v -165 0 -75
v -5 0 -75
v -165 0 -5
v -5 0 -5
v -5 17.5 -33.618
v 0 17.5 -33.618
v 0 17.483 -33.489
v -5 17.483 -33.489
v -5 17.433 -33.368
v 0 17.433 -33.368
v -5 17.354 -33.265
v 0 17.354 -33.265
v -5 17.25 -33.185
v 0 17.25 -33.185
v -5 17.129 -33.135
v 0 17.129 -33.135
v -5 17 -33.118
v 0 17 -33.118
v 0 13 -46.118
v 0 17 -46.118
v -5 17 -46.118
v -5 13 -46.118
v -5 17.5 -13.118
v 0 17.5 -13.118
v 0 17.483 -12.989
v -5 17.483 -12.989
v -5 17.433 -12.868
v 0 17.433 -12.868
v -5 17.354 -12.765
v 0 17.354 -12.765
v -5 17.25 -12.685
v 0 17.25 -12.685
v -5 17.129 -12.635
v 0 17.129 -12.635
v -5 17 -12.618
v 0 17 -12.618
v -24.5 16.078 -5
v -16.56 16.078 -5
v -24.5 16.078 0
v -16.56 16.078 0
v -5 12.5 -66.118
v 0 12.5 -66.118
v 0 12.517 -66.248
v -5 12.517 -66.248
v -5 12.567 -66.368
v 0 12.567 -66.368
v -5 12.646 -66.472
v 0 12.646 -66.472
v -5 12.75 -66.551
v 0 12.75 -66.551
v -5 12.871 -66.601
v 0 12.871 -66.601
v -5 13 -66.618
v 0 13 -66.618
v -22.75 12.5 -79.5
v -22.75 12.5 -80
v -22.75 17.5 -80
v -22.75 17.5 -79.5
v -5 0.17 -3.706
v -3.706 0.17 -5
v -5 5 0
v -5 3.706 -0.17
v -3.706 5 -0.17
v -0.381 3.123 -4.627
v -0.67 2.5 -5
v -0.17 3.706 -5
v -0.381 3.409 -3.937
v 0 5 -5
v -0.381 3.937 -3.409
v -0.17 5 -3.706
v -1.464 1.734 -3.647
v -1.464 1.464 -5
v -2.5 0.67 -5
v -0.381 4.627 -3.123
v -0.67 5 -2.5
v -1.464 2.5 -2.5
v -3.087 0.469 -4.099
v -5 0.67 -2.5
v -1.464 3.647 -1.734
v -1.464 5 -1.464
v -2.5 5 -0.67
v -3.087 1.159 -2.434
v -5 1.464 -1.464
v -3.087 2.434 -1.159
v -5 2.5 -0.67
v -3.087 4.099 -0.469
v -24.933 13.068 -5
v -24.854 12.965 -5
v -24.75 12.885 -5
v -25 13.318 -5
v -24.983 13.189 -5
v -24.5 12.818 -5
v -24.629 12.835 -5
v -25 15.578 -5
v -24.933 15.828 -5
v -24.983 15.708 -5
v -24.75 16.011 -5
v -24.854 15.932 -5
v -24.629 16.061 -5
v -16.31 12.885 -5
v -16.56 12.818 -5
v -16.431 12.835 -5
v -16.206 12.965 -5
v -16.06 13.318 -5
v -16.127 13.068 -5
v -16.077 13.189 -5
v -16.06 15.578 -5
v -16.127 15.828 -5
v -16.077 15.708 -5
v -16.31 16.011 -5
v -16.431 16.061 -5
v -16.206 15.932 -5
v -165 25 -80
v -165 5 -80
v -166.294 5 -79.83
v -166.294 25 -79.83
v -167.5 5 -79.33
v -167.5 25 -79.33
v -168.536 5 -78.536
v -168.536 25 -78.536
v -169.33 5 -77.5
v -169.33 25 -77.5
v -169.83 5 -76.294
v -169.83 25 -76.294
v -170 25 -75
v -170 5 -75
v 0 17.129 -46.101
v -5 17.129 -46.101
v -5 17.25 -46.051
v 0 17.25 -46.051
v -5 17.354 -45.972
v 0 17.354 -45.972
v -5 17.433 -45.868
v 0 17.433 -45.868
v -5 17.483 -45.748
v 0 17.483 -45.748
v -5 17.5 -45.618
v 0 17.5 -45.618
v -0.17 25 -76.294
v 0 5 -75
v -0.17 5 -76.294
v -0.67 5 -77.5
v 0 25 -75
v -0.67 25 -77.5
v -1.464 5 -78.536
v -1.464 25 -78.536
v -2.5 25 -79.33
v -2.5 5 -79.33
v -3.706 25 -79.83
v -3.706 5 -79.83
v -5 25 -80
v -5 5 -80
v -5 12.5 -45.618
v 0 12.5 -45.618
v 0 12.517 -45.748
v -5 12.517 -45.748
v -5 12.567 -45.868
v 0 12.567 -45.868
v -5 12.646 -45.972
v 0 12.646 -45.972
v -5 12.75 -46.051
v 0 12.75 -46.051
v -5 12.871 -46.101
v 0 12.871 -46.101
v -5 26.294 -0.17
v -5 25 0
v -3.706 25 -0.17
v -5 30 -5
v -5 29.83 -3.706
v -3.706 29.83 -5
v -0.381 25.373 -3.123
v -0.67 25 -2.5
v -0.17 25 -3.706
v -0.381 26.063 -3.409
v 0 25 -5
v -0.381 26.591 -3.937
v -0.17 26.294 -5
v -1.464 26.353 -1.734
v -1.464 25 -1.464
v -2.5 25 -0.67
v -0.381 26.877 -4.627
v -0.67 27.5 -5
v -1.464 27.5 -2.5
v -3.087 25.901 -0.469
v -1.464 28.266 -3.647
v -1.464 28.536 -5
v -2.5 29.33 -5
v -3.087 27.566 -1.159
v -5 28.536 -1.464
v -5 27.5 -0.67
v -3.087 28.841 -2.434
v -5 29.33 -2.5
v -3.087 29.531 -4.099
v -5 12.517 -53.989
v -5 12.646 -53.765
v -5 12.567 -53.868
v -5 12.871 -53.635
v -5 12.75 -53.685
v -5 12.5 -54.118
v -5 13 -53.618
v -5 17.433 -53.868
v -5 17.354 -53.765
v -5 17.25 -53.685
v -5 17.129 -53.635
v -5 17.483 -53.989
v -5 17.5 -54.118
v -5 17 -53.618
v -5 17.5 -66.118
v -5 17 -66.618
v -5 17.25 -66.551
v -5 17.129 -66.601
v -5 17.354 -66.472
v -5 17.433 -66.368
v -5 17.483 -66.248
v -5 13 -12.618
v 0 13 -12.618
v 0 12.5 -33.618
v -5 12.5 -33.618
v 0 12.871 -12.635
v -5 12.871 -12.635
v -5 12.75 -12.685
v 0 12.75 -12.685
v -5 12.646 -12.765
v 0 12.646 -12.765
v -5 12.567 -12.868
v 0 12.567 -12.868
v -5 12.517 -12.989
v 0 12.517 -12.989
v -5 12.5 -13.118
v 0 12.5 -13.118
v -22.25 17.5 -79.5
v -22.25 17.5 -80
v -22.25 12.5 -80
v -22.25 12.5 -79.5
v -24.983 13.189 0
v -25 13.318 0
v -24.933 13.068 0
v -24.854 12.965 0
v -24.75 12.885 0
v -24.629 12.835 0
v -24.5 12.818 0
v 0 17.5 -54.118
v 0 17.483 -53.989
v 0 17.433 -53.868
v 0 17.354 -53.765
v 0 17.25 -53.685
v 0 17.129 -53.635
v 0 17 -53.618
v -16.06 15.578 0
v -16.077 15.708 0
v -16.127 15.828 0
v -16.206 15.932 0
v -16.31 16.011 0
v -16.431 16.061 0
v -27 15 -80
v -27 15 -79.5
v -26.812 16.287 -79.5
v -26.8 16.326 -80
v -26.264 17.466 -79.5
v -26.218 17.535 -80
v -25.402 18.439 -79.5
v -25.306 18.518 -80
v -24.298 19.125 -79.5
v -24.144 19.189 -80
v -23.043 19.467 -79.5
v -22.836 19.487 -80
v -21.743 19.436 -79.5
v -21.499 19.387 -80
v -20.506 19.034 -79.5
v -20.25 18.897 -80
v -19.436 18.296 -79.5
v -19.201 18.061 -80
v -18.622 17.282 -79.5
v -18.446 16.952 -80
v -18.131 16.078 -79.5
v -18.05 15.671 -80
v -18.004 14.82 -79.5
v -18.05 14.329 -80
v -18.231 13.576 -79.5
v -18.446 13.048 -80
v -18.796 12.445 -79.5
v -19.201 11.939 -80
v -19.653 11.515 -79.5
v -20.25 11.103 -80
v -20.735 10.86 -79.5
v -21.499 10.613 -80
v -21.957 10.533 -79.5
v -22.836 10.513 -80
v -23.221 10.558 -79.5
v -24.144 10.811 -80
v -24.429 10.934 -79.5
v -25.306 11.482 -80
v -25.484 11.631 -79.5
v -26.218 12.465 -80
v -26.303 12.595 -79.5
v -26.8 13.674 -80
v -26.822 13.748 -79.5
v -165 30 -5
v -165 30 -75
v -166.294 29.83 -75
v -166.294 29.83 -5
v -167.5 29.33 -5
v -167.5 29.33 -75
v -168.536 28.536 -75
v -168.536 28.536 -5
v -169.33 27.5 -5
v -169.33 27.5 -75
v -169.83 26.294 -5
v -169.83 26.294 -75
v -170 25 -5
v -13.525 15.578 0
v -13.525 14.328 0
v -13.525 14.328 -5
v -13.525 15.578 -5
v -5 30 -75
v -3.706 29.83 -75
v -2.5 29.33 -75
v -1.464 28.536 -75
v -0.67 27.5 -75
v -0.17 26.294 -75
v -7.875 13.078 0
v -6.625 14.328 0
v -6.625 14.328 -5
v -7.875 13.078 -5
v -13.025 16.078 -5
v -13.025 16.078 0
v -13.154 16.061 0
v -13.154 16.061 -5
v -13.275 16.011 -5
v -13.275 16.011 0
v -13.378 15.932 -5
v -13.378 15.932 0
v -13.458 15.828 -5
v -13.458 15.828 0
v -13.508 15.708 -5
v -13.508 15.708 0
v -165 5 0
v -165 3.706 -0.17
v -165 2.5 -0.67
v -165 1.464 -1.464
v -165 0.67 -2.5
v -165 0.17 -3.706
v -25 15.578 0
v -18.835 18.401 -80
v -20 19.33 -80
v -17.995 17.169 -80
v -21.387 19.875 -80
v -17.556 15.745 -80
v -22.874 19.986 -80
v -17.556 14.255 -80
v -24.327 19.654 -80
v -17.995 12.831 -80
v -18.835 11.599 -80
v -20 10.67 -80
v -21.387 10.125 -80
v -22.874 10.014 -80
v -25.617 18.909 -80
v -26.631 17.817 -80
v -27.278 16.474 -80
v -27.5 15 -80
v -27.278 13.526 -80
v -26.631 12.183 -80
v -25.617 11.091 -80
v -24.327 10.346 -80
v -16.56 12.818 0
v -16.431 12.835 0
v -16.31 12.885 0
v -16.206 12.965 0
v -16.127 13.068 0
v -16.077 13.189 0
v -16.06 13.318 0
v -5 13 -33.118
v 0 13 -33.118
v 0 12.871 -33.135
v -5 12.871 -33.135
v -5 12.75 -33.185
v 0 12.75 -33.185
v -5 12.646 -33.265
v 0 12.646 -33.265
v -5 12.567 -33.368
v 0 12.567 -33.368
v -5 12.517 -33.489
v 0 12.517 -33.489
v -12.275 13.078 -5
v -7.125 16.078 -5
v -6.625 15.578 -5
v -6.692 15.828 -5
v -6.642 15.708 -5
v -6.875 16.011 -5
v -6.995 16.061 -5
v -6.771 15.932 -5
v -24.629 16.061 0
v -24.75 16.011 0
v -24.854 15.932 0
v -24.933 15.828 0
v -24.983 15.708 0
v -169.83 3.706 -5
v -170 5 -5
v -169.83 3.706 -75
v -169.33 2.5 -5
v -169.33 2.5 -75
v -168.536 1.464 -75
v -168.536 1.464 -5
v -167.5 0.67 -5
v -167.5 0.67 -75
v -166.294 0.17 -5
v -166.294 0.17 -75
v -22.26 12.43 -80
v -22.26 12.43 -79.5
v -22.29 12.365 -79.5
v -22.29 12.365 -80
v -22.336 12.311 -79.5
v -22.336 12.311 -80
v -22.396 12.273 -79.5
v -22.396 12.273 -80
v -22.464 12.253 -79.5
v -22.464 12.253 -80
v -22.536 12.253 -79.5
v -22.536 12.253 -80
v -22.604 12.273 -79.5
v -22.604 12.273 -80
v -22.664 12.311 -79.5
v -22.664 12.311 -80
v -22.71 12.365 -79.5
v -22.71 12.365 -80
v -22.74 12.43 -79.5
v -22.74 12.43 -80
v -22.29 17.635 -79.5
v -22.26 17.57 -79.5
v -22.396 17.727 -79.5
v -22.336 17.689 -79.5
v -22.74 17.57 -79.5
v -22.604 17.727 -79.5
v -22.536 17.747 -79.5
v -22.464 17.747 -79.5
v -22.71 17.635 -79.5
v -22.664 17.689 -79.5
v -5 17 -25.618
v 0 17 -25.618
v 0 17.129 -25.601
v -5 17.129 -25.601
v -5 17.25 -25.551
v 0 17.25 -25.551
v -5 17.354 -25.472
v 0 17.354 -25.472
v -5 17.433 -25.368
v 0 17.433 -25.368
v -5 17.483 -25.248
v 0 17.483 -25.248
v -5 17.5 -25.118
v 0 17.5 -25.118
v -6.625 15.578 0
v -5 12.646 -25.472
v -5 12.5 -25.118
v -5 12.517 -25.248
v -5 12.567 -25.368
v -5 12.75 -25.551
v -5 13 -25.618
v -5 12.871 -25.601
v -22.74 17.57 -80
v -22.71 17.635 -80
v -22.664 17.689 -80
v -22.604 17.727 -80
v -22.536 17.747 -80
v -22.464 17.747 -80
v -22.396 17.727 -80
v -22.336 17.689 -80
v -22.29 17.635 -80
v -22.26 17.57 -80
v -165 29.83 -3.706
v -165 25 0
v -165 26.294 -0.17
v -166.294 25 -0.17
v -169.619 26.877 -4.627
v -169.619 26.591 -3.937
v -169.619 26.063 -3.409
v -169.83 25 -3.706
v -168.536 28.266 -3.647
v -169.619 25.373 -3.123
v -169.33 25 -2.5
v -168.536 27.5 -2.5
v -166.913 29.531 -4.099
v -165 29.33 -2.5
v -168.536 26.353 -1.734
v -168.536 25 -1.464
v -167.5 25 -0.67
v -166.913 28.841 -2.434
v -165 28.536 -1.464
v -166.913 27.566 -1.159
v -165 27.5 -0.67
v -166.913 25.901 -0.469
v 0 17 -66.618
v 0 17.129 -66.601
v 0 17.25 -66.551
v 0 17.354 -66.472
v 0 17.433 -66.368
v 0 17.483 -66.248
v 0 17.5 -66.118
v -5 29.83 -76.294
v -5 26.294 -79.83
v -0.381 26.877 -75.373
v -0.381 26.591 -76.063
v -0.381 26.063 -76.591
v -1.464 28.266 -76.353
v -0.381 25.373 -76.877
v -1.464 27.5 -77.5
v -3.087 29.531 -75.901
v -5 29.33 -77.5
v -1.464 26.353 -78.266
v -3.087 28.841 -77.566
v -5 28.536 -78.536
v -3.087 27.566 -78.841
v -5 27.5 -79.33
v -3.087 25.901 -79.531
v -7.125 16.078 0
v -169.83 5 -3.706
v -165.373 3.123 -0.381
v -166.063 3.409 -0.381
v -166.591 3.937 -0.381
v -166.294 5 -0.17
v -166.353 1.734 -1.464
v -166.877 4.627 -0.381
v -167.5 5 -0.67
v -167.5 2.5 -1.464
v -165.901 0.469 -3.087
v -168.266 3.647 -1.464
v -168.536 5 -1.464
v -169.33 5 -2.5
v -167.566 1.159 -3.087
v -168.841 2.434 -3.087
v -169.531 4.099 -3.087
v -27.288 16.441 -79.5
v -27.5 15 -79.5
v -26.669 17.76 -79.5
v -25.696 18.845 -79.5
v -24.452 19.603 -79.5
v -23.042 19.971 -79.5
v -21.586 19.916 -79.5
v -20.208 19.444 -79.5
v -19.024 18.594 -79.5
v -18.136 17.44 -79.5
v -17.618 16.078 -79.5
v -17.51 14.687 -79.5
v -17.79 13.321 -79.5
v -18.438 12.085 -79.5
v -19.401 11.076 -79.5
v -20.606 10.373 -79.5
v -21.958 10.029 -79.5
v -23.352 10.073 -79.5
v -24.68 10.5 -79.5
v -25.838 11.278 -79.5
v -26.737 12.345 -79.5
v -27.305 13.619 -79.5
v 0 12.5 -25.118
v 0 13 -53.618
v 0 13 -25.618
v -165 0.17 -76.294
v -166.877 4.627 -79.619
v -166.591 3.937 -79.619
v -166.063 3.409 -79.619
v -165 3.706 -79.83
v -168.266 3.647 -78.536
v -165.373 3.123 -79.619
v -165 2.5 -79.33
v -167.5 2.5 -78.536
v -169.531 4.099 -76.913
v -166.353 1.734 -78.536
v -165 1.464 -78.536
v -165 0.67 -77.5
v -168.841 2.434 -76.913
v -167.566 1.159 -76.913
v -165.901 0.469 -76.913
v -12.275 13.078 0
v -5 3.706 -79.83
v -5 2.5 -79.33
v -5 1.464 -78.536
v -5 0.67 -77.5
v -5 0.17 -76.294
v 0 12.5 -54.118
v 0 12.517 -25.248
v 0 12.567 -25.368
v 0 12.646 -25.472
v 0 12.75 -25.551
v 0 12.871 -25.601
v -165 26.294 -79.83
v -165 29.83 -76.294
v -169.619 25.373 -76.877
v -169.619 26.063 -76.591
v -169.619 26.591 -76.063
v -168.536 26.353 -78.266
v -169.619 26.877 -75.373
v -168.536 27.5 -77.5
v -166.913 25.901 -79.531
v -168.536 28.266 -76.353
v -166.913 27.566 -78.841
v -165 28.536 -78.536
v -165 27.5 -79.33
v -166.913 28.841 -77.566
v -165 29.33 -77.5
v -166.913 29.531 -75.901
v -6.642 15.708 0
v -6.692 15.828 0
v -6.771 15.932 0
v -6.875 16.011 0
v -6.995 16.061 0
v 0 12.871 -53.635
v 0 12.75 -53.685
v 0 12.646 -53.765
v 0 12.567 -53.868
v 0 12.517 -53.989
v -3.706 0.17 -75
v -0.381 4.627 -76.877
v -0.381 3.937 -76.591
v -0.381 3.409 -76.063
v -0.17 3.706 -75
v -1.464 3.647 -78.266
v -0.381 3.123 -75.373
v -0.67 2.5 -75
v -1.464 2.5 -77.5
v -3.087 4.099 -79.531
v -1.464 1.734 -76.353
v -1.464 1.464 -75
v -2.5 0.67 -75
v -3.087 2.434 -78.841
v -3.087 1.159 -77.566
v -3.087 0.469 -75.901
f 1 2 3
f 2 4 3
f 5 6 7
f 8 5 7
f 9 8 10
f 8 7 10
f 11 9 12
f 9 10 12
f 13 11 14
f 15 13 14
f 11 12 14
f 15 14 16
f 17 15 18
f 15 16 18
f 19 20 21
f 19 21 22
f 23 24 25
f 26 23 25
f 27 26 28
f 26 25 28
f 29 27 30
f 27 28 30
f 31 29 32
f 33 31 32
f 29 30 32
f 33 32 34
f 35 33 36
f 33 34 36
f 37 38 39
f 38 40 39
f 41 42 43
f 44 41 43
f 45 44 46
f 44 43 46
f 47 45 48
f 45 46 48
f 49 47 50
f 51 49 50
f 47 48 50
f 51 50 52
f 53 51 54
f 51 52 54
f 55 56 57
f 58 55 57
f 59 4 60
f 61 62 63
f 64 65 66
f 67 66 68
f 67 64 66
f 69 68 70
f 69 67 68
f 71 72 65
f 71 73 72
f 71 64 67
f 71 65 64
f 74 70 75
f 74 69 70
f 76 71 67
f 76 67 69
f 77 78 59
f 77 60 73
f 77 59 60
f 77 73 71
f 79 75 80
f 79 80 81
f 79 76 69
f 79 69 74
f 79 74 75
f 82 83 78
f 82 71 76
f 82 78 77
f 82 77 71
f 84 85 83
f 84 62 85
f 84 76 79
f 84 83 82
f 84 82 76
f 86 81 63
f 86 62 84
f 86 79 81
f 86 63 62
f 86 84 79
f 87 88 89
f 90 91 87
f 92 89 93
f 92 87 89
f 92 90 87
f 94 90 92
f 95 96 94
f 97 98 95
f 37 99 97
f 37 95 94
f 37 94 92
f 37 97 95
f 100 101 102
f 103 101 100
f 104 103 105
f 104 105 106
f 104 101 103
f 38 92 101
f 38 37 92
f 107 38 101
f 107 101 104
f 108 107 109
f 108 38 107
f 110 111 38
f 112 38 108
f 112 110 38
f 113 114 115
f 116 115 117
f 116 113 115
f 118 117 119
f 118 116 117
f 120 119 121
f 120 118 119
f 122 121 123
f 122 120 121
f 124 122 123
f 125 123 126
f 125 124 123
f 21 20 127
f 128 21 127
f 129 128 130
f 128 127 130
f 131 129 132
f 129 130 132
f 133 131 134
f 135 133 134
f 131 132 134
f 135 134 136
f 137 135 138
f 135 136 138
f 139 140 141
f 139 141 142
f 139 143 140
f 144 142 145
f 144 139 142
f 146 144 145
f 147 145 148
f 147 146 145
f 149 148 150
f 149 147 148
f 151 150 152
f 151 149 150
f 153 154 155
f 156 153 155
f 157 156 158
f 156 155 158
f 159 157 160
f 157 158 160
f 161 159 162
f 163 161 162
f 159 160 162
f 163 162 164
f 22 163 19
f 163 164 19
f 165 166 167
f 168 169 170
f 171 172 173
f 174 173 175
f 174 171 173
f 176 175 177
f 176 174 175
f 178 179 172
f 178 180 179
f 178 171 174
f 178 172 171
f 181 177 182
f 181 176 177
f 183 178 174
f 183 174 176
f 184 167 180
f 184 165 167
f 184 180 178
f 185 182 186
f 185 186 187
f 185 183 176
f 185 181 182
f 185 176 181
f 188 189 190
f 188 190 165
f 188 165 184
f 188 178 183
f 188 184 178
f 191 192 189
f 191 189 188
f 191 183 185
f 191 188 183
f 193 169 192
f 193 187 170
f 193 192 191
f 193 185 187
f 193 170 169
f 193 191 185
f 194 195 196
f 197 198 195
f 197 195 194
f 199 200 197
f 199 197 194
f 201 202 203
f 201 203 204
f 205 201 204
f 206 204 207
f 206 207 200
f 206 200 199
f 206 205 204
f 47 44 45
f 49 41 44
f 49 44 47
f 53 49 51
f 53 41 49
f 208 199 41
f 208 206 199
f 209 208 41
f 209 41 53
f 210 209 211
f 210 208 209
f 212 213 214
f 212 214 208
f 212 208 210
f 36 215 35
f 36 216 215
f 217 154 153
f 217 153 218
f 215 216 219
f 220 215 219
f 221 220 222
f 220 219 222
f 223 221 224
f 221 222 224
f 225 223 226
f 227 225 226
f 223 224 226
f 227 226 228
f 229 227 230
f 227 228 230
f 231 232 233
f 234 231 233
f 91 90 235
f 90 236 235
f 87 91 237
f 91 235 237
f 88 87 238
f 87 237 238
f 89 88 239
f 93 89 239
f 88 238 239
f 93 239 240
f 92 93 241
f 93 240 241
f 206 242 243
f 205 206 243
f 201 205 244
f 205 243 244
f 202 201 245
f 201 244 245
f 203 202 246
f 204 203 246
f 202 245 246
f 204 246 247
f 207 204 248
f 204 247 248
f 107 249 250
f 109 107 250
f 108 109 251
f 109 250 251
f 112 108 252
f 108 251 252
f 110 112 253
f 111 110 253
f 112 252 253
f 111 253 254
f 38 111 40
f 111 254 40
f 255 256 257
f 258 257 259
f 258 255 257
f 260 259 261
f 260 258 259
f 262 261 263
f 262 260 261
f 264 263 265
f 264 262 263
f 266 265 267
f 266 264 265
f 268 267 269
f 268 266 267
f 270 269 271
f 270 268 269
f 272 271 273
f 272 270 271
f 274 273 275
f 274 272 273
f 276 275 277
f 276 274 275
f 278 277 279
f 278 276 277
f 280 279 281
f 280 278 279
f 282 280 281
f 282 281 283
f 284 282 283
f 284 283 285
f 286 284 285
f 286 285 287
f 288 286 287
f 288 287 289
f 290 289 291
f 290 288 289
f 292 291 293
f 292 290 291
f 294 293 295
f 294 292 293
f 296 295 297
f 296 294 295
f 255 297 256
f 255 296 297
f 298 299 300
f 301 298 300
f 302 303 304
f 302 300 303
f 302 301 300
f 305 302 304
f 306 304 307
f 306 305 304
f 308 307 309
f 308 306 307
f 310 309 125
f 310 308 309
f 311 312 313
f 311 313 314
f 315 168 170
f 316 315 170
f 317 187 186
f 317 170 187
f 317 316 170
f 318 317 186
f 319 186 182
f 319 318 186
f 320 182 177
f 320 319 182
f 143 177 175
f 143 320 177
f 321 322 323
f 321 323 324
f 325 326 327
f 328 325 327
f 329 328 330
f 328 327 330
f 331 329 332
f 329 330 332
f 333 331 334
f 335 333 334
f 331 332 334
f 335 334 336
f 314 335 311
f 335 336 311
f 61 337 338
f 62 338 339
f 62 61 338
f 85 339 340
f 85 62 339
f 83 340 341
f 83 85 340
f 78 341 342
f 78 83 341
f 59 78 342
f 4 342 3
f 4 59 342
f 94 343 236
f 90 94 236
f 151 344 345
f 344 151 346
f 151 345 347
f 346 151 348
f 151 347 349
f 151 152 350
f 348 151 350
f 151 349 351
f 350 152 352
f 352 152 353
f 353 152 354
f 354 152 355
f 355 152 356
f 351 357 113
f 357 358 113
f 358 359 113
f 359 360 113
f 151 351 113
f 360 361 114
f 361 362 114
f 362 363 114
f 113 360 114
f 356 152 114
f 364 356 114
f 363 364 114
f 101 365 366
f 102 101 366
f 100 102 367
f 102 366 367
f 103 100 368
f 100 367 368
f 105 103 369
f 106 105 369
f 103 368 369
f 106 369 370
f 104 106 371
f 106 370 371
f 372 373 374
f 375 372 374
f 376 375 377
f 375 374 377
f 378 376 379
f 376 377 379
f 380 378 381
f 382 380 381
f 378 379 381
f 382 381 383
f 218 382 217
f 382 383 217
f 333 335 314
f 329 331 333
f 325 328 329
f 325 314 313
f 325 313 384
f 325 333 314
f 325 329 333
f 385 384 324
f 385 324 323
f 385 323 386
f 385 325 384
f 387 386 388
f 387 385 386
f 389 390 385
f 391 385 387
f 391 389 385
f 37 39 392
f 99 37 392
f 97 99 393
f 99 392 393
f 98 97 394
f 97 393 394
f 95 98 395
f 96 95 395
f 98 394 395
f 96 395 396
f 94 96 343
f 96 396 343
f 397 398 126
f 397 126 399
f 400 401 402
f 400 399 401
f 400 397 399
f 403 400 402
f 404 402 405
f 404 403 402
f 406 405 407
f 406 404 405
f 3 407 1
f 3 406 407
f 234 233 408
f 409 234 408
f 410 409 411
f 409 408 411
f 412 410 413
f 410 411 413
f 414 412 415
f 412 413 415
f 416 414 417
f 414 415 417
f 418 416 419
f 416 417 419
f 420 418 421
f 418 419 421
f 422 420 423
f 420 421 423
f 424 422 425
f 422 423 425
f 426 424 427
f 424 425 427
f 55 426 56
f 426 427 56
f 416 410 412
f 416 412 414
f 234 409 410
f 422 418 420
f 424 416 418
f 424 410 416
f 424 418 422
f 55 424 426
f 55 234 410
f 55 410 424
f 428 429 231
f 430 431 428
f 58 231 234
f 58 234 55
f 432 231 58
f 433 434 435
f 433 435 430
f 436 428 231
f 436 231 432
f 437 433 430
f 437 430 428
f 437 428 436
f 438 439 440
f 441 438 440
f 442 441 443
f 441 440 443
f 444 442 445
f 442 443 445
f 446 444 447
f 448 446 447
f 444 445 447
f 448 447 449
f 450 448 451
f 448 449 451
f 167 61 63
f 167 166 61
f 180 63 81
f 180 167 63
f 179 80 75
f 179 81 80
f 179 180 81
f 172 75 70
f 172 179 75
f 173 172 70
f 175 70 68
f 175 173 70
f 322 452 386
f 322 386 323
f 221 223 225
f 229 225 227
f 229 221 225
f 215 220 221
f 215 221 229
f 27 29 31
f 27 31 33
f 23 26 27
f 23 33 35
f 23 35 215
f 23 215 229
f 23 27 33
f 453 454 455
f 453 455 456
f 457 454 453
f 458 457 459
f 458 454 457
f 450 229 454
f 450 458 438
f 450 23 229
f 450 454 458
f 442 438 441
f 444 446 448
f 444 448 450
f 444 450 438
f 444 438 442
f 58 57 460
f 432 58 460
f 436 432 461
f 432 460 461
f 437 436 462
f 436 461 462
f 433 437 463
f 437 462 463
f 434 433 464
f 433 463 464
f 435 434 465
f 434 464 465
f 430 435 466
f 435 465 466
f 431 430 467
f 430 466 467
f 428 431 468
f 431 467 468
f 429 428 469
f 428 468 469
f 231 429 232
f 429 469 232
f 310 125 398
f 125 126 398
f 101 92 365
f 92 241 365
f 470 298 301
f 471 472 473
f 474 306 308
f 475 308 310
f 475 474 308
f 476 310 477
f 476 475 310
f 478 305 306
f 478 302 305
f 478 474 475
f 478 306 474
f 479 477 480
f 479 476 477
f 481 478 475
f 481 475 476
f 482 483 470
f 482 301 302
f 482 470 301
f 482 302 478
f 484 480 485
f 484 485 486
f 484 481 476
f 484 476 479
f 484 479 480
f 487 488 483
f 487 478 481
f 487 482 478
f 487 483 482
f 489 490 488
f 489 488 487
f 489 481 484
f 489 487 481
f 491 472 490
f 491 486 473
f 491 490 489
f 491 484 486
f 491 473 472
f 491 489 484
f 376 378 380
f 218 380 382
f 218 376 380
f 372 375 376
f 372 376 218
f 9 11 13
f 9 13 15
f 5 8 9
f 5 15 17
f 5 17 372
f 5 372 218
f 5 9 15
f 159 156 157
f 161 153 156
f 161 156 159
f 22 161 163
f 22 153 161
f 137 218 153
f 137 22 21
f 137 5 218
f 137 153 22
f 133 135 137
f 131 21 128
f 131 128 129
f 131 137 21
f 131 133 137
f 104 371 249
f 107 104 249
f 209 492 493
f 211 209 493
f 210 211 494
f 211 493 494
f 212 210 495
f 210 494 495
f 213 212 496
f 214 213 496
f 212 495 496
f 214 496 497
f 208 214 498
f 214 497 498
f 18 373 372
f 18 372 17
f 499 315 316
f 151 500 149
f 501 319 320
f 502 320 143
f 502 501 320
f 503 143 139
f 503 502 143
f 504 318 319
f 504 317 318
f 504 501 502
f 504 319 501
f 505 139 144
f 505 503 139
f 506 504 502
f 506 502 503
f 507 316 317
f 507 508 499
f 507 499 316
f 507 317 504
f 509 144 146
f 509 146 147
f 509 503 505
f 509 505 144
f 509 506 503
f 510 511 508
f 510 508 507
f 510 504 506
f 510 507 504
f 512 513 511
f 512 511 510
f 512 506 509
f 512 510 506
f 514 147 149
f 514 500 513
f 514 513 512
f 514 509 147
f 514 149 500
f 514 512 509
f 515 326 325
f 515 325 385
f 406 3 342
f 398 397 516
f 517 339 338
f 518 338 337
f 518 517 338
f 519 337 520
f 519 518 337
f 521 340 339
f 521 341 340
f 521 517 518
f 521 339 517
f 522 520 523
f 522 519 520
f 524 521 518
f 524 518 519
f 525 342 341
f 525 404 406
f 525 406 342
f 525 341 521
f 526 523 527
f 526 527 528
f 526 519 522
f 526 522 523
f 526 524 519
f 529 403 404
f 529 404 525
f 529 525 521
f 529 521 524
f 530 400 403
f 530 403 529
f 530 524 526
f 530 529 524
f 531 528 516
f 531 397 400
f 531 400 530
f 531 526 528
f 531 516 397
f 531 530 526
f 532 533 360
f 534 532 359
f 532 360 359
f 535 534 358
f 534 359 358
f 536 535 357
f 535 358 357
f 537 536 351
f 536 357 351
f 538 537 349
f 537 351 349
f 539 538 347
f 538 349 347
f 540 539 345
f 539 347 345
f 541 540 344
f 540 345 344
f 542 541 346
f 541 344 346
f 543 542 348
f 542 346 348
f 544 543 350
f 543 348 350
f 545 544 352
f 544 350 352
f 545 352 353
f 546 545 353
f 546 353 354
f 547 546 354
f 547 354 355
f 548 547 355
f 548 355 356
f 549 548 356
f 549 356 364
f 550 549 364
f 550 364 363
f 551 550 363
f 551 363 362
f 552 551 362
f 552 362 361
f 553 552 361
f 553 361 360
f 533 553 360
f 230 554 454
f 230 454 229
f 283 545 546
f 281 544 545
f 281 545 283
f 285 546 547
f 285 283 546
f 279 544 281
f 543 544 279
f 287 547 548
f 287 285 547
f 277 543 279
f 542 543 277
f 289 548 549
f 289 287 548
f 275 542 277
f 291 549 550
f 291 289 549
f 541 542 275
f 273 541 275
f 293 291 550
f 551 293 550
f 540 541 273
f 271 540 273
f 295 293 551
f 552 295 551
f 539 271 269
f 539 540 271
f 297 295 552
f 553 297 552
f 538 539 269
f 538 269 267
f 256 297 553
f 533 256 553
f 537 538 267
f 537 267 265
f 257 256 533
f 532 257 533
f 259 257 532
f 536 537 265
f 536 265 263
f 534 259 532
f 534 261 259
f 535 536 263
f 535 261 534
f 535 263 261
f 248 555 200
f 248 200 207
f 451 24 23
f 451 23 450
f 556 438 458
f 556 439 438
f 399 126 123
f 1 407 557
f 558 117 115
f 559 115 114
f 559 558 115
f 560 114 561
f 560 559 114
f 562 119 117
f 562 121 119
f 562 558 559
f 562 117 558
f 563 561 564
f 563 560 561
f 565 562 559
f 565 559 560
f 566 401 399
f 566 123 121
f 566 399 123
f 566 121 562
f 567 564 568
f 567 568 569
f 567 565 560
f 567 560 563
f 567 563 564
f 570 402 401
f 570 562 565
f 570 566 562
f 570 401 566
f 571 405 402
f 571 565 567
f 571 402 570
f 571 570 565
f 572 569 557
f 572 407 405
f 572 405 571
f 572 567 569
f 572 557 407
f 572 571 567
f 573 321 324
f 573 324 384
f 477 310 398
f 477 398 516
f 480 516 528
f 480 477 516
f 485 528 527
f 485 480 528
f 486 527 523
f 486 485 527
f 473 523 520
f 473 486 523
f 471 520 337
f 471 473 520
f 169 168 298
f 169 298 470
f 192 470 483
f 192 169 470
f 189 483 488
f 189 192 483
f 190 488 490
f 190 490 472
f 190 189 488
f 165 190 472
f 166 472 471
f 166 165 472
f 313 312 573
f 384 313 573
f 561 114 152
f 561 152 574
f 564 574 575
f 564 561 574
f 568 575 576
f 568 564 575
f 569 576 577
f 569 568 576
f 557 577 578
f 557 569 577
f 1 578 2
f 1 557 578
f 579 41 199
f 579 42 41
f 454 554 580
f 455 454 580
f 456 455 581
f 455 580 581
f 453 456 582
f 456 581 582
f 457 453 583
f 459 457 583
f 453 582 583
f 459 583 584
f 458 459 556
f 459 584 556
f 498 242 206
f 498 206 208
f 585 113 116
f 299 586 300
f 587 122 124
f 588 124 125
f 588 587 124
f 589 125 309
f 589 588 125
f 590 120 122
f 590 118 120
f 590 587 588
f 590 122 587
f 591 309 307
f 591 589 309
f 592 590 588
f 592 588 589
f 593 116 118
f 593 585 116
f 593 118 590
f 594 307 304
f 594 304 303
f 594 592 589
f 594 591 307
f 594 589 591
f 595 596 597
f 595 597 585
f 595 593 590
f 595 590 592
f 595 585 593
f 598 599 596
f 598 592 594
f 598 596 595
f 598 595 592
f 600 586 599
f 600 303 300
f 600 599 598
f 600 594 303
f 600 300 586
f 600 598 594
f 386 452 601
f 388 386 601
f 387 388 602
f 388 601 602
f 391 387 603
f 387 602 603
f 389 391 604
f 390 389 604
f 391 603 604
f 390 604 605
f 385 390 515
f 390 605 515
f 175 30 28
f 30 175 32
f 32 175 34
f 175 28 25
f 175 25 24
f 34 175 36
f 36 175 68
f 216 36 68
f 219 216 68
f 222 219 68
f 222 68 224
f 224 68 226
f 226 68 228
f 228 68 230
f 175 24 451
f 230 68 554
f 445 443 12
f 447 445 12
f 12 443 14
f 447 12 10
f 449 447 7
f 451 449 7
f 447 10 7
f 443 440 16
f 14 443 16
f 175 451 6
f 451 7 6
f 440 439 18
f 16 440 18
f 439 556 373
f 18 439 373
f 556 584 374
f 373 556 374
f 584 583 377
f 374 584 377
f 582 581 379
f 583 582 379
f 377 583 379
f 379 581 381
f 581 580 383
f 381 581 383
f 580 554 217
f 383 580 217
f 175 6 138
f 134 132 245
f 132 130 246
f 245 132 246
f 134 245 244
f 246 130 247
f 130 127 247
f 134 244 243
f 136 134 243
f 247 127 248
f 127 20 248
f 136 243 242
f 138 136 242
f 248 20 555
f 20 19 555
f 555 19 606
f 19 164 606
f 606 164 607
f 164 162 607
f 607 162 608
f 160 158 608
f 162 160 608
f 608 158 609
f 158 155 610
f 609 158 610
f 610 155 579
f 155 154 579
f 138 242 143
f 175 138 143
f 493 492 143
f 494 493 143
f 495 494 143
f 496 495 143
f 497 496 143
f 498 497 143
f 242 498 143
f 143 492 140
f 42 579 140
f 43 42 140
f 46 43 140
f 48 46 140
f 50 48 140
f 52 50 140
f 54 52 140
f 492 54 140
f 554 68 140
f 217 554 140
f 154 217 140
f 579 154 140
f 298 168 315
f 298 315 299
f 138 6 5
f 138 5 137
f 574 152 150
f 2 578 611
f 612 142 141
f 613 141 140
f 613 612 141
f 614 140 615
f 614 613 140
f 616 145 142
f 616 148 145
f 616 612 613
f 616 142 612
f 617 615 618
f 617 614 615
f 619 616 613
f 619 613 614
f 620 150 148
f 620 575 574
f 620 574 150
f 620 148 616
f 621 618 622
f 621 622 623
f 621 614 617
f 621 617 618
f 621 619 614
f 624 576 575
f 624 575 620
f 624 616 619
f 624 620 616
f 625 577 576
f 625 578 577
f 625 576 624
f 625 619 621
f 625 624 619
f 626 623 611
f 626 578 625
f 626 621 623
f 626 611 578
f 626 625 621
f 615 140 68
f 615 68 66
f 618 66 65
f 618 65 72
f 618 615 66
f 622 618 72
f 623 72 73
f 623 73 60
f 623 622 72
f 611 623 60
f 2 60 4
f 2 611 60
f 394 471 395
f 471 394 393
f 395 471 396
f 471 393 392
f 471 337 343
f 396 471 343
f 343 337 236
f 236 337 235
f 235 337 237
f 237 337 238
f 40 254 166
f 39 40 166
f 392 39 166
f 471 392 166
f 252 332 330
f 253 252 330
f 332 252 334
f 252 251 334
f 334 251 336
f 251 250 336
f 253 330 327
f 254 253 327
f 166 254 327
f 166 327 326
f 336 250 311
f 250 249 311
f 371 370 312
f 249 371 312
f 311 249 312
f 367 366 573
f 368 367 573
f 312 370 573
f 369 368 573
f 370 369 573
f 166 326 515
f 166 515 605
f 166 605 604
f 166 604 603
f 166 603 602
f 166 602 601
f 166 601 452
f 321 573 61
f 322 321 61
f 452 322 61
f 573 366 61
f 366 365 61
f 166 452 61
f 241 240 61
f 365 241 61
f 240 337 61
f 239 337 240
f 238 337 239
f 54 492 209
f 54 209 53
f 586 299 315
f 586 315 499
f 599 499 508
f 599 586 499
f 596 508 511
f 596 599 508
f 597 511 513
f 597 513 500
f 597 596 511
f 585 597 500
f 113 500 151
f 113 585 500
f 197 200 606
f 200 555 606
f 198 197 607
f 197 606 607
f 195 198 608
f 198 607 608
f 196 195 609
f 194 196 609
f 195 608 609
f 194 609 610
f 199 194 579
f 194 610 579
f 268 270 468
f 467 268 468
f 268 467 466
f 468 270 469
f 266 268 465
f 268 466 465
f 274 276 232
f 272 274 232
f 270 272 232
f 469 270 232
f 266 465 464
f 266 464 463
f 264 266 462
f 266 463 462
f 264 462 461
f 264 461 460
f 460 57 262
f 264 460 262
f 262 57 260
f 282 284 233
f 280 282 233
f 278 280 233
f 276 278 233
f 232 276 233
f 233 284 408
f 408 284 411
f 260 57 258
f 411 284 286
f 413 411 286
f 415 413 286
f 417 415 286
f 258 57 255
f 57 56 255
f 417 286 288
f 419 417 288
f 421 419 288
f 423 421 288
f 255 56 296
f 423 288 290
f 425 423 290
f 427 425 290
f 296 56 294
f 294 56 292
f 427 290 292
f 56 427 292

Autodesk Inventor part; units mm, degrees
ref_plane "YZ Plane" through (0, 0, 0) normal (1, 0, 0) x (0, 1, 0)
ref_plane "XZ Plane" through (0, 0, 0) normal (0, 1, 0) x (-1, 0, 0)
ref_plane "XY Plane" through (0, 0, 0) normal (0, 0, 1) x (1, 0, 0)
sketch "Sketch1" plane through (0, 0, 0) normal (0, 1, 0) x (-1, 0, 0)
  line L0 (170, 0) -> (0, 0)
  line L1 (0, 0) -> (0, -80)
  line L2 (0, -80) -> (170, -80)
  line L3 (170, -80) -> (170, 0)
  dimension "d1" = 170
  dimension "d2" = 80
extrude "Extrusion1" add sketch "Sketch1" along normal blind 30
fillet "Fillet1" radius 5 12 edges at (-85, 30, 0) (-85, 30, -80) (0, 30, -40) (-170, 30, -40) (-170, 0, -40) (-170, 15, 0) (-85, 0, 0) (-85, 0, -80) (0, 15, -80) (0, 0, -40) (-170, 15, -80) (0, 15, 0)
sketch "Sketch2" plane through (-165, 5, 0) normal (0, 0, 1) x (1, 0, 0)
  line L0 (148.44, 11.0782) -> (140.5, 11.0782)
  line L1 (140, 10.5782) -> (140, 8.3182)
  line L2 (140.5, 7.8182) -> (148.44, 7.8182)
  line L3 (148.94, 8.3182) -> (148.94, 10.5782)
  line L4 (0, 0) -> (0, 20) projected
  arc A0 (140.5, 11.0782) -> (140, 10.5782) centre (140.5, 10.5782) ccw
  arc A1 (140, 8.3182) -> (140.5, 7.8182) centre (140.5, 8.3182) ccw
  arc A2 (148.94, 10.5782) -> (148.44, 11.0782) centre (148.44, 10.5782) ccw
  arc A3 (148.44, 7.8182) -> (148.94, 8.3182) centre (148.44, 8.3182) ccw
  line L5 (151.9753, 11.0782) -> (157.8753, 11.0782)
  line L6 (158.3753, 10.5782) -> (158.3753, 9.3282)
  line L7 (156.8753, 8.0782) -> (152.7253, 8.0782)
  line L8 (151.4753, 9.3282) -> (151.4753, 10.5782)
  line L9 (151.4753, 8.0782) -> (151.4753, 8.0782)
  line L10 (151.4753, 8.0782) -> (151.4753, 8.0782) construction
  line L11 (157.1253, 8.0782) -> (156.8753, 8.0782)
  arc A4 (151.9753, 11.0782) -> (151.4753, 10.5782) centre (151.9753, 10.5782) ccw
  arc A5 (158.3753, 10.5782) -> (157.8753, 11.0782) centre (157.8753, 10.5782) ccw
  line L12 (151.4753, 9.3282) -> (152.7253, 8.0782)
  line L13 (151.4753, 9.3282) -> (153.243, 9.3282) construction
  line L14 (158.3753, 9.3282) -> (157.1253, 8.0782)
  point P0 (165, -5)
  point P1 (140, 7.8182)
  point P2 (140, 11.0782)
  point P3 (148.94, 7.8182)
  point P4 (158.3753, 11.0782)
  dimension "d6" = 8.94
  dimension "d7" = 3.26
  dimension "d8" = 140
  dimension "d9" = 0.5
  dimension "d12" = 45
  dimension "d13" = 0
  dimension "d14" = 1.25
  dimension "d15" = 0.5
  dimension "d16" = 6.9
  dimension "d17" = 45
  dimension "d18" = 3
extrude "Extrusion2" cut sketch "Sketch2" against normal blind 5
sketch "Sketch3" plane through (0, 5, -75) normal (1, 0, 0) x (0, 0, -1)
  line L0 (-61.8816, 12.5) -> (-49.8816, 12.5)
  line L1 (-49.3816, 12) -> (-49.3816, 8)
  line L2 (-49.8816, 7.5) -> (-61.8816, 7.5)
  line L3 (-62.3816, 8) -> (-62.3816, 12)
  line L4 (-41.3816, 12.5) -> (-29.3816, 12.5)
  line L5 (-28.8816, 12) -> (-28.8816, 8)
  line L6 (-29.3816, 7.5) -> (-41.3816, 7.5)
  line L7 (-41.8816, 8) -> (-41.8816, 12)
  line L8 (-20.8816, 12.5) -> (-8.8816, 12.5)
  line L9 (-8.3816, 12) -> (-8.3816, 8)
  line L10 (-8.8816, 7.5) -> (-20.8816, 7.5)
  line L11 (-21.3816, 8) -> (-21.3816, 12)
  line L12 (-75, 20) -> (-75, 0) projected
  line L13 (5, 0) -> (5, 20) projected
  line L14 (0, 25) -> (-70, 25) projected
  arc A0 (-61.8816, 12.5) -> (-62.3816, 12) centre (-61.8816, 12) ccw
  arc A1 (-49.3816, 12) -> (-49.8816, 12.5) centre (-49.8816, 12) ccw
  arc A2 (-62.3816, 8) -> (-61.8816, 7.5) centre (-61.8816, 8) ccw
  arc A3 (-49.8816, 7.5) -> (-49.3816, 8) centre (-49.8816, 8) ccw
  arc A4 (-41.3816, 12.5) -> (-41.8816, 12) centre (-41.3816, 12) ccw
  arc A5 (-28.8816, 12) -> (-29.3816, 12.5) centre (-29.3816, 12) ccw
  arc A6 (-41.8816, 8) -> (-41.3816, 7.5) centre (-41.3816, 8) ccw
  arc A7 (-29.3816, 7.5) -> (-28.8816, 8) centre (-29.3816, 8) ccw
  arc A8 (-20.8816, 12.5) -> (-21.3816, 12) centre (-20.8816, 12) ccw
  arc A9 (-8.3816, 12) -> (-8.8816, 12.5) centre (-8.8816, 12) ccw
  arc A10 (-21.3816, 8) -> (-20.8816, 7.5) centre (-20.8816, 8) ccw
  arc A11 (-8.8816, 7.5) -> (-8.3816, 8) centre (-8.8816, 8) ccw
  point P0 (-75, -5)
  point P1 (-49.3816, 7.5)
  point P2 (-49.3816, 12.5)
  point P3 (-62.3816, 7.5)
  point P4 (-28.8816, 7.5)
  point P5 (-28.8816, 12.5)
  point P6 (-41.8816, 7.5)
  point P7 (-8.3816, 7.5)
  point P8 (-8.3816, 12.5)
  point P9 (-21.3816, 7.5)
  point P10 (-49.3816, 10)
  point P11 (-21.3816, 10)
  point P12 (-28.8816, 10)
  point P13 (5, 10)
  point P14 (-62.3816, 10)
  dimension "d21" = 13
  dimension "d22" = 5
  dimension "d23" = 13
  dimension "d24" = 5
  dimension "d25" = 13
  dimension "d26" = 5
  dimension "d27" = 7.5
  dimension "d28" = 7.5
  dimension "d32" = 15
  dimension "d33" = 0.5
extrude "Extrusion3" cut sketch "Sketch3" against normal blind 5
sketch "Sketch4" plane through (-5, 5, -80) normal (0, 0, -1) x (-1, 0, 0)
  circle A0 centre (17.5, 10) radius 5
  line L0 (-5, 20) -> (-5, 0) projected
  line L1 (0, -5) -> (160, -5) projected
  circle A1 centre (17.5, 10) radius 4.5
  line L2 (17.5, 7.5) -> (17.5, 12.5) construction
  line L3 (19.5, 11.0782) -> (11.56, 11.0782) projected
  line L4 (17.75, 7.5) -> (17.75, 12.5)
  line L5 (17.25, 12.5) -> (17.25, 7.5)
  arc A2 (17.25, 7.5) -> (17.75, 7.5) centre (17.5, 7.5) ccw
  arc A3 (17.75, 12.5) -> (17.25, 12.5) centre (17.5, 12.5) ccw
  line L6 (17.5, 10) -> (22.5, 10) construction
  point P0 (-5, -5)
  dimension "d36" = 10
  dimension "d37" = 22.5
  dimension "d38" = 15
  dimension "d39" = 9
  dimension "d40" = 2.5
  dimension "d41" = 90
  dimension "d42" = 0.5
extrude "Extrusion4" cut sketch "Sketch4" against normal blind 0.5
properties part number "Large Battery" material "PET Plastic"
